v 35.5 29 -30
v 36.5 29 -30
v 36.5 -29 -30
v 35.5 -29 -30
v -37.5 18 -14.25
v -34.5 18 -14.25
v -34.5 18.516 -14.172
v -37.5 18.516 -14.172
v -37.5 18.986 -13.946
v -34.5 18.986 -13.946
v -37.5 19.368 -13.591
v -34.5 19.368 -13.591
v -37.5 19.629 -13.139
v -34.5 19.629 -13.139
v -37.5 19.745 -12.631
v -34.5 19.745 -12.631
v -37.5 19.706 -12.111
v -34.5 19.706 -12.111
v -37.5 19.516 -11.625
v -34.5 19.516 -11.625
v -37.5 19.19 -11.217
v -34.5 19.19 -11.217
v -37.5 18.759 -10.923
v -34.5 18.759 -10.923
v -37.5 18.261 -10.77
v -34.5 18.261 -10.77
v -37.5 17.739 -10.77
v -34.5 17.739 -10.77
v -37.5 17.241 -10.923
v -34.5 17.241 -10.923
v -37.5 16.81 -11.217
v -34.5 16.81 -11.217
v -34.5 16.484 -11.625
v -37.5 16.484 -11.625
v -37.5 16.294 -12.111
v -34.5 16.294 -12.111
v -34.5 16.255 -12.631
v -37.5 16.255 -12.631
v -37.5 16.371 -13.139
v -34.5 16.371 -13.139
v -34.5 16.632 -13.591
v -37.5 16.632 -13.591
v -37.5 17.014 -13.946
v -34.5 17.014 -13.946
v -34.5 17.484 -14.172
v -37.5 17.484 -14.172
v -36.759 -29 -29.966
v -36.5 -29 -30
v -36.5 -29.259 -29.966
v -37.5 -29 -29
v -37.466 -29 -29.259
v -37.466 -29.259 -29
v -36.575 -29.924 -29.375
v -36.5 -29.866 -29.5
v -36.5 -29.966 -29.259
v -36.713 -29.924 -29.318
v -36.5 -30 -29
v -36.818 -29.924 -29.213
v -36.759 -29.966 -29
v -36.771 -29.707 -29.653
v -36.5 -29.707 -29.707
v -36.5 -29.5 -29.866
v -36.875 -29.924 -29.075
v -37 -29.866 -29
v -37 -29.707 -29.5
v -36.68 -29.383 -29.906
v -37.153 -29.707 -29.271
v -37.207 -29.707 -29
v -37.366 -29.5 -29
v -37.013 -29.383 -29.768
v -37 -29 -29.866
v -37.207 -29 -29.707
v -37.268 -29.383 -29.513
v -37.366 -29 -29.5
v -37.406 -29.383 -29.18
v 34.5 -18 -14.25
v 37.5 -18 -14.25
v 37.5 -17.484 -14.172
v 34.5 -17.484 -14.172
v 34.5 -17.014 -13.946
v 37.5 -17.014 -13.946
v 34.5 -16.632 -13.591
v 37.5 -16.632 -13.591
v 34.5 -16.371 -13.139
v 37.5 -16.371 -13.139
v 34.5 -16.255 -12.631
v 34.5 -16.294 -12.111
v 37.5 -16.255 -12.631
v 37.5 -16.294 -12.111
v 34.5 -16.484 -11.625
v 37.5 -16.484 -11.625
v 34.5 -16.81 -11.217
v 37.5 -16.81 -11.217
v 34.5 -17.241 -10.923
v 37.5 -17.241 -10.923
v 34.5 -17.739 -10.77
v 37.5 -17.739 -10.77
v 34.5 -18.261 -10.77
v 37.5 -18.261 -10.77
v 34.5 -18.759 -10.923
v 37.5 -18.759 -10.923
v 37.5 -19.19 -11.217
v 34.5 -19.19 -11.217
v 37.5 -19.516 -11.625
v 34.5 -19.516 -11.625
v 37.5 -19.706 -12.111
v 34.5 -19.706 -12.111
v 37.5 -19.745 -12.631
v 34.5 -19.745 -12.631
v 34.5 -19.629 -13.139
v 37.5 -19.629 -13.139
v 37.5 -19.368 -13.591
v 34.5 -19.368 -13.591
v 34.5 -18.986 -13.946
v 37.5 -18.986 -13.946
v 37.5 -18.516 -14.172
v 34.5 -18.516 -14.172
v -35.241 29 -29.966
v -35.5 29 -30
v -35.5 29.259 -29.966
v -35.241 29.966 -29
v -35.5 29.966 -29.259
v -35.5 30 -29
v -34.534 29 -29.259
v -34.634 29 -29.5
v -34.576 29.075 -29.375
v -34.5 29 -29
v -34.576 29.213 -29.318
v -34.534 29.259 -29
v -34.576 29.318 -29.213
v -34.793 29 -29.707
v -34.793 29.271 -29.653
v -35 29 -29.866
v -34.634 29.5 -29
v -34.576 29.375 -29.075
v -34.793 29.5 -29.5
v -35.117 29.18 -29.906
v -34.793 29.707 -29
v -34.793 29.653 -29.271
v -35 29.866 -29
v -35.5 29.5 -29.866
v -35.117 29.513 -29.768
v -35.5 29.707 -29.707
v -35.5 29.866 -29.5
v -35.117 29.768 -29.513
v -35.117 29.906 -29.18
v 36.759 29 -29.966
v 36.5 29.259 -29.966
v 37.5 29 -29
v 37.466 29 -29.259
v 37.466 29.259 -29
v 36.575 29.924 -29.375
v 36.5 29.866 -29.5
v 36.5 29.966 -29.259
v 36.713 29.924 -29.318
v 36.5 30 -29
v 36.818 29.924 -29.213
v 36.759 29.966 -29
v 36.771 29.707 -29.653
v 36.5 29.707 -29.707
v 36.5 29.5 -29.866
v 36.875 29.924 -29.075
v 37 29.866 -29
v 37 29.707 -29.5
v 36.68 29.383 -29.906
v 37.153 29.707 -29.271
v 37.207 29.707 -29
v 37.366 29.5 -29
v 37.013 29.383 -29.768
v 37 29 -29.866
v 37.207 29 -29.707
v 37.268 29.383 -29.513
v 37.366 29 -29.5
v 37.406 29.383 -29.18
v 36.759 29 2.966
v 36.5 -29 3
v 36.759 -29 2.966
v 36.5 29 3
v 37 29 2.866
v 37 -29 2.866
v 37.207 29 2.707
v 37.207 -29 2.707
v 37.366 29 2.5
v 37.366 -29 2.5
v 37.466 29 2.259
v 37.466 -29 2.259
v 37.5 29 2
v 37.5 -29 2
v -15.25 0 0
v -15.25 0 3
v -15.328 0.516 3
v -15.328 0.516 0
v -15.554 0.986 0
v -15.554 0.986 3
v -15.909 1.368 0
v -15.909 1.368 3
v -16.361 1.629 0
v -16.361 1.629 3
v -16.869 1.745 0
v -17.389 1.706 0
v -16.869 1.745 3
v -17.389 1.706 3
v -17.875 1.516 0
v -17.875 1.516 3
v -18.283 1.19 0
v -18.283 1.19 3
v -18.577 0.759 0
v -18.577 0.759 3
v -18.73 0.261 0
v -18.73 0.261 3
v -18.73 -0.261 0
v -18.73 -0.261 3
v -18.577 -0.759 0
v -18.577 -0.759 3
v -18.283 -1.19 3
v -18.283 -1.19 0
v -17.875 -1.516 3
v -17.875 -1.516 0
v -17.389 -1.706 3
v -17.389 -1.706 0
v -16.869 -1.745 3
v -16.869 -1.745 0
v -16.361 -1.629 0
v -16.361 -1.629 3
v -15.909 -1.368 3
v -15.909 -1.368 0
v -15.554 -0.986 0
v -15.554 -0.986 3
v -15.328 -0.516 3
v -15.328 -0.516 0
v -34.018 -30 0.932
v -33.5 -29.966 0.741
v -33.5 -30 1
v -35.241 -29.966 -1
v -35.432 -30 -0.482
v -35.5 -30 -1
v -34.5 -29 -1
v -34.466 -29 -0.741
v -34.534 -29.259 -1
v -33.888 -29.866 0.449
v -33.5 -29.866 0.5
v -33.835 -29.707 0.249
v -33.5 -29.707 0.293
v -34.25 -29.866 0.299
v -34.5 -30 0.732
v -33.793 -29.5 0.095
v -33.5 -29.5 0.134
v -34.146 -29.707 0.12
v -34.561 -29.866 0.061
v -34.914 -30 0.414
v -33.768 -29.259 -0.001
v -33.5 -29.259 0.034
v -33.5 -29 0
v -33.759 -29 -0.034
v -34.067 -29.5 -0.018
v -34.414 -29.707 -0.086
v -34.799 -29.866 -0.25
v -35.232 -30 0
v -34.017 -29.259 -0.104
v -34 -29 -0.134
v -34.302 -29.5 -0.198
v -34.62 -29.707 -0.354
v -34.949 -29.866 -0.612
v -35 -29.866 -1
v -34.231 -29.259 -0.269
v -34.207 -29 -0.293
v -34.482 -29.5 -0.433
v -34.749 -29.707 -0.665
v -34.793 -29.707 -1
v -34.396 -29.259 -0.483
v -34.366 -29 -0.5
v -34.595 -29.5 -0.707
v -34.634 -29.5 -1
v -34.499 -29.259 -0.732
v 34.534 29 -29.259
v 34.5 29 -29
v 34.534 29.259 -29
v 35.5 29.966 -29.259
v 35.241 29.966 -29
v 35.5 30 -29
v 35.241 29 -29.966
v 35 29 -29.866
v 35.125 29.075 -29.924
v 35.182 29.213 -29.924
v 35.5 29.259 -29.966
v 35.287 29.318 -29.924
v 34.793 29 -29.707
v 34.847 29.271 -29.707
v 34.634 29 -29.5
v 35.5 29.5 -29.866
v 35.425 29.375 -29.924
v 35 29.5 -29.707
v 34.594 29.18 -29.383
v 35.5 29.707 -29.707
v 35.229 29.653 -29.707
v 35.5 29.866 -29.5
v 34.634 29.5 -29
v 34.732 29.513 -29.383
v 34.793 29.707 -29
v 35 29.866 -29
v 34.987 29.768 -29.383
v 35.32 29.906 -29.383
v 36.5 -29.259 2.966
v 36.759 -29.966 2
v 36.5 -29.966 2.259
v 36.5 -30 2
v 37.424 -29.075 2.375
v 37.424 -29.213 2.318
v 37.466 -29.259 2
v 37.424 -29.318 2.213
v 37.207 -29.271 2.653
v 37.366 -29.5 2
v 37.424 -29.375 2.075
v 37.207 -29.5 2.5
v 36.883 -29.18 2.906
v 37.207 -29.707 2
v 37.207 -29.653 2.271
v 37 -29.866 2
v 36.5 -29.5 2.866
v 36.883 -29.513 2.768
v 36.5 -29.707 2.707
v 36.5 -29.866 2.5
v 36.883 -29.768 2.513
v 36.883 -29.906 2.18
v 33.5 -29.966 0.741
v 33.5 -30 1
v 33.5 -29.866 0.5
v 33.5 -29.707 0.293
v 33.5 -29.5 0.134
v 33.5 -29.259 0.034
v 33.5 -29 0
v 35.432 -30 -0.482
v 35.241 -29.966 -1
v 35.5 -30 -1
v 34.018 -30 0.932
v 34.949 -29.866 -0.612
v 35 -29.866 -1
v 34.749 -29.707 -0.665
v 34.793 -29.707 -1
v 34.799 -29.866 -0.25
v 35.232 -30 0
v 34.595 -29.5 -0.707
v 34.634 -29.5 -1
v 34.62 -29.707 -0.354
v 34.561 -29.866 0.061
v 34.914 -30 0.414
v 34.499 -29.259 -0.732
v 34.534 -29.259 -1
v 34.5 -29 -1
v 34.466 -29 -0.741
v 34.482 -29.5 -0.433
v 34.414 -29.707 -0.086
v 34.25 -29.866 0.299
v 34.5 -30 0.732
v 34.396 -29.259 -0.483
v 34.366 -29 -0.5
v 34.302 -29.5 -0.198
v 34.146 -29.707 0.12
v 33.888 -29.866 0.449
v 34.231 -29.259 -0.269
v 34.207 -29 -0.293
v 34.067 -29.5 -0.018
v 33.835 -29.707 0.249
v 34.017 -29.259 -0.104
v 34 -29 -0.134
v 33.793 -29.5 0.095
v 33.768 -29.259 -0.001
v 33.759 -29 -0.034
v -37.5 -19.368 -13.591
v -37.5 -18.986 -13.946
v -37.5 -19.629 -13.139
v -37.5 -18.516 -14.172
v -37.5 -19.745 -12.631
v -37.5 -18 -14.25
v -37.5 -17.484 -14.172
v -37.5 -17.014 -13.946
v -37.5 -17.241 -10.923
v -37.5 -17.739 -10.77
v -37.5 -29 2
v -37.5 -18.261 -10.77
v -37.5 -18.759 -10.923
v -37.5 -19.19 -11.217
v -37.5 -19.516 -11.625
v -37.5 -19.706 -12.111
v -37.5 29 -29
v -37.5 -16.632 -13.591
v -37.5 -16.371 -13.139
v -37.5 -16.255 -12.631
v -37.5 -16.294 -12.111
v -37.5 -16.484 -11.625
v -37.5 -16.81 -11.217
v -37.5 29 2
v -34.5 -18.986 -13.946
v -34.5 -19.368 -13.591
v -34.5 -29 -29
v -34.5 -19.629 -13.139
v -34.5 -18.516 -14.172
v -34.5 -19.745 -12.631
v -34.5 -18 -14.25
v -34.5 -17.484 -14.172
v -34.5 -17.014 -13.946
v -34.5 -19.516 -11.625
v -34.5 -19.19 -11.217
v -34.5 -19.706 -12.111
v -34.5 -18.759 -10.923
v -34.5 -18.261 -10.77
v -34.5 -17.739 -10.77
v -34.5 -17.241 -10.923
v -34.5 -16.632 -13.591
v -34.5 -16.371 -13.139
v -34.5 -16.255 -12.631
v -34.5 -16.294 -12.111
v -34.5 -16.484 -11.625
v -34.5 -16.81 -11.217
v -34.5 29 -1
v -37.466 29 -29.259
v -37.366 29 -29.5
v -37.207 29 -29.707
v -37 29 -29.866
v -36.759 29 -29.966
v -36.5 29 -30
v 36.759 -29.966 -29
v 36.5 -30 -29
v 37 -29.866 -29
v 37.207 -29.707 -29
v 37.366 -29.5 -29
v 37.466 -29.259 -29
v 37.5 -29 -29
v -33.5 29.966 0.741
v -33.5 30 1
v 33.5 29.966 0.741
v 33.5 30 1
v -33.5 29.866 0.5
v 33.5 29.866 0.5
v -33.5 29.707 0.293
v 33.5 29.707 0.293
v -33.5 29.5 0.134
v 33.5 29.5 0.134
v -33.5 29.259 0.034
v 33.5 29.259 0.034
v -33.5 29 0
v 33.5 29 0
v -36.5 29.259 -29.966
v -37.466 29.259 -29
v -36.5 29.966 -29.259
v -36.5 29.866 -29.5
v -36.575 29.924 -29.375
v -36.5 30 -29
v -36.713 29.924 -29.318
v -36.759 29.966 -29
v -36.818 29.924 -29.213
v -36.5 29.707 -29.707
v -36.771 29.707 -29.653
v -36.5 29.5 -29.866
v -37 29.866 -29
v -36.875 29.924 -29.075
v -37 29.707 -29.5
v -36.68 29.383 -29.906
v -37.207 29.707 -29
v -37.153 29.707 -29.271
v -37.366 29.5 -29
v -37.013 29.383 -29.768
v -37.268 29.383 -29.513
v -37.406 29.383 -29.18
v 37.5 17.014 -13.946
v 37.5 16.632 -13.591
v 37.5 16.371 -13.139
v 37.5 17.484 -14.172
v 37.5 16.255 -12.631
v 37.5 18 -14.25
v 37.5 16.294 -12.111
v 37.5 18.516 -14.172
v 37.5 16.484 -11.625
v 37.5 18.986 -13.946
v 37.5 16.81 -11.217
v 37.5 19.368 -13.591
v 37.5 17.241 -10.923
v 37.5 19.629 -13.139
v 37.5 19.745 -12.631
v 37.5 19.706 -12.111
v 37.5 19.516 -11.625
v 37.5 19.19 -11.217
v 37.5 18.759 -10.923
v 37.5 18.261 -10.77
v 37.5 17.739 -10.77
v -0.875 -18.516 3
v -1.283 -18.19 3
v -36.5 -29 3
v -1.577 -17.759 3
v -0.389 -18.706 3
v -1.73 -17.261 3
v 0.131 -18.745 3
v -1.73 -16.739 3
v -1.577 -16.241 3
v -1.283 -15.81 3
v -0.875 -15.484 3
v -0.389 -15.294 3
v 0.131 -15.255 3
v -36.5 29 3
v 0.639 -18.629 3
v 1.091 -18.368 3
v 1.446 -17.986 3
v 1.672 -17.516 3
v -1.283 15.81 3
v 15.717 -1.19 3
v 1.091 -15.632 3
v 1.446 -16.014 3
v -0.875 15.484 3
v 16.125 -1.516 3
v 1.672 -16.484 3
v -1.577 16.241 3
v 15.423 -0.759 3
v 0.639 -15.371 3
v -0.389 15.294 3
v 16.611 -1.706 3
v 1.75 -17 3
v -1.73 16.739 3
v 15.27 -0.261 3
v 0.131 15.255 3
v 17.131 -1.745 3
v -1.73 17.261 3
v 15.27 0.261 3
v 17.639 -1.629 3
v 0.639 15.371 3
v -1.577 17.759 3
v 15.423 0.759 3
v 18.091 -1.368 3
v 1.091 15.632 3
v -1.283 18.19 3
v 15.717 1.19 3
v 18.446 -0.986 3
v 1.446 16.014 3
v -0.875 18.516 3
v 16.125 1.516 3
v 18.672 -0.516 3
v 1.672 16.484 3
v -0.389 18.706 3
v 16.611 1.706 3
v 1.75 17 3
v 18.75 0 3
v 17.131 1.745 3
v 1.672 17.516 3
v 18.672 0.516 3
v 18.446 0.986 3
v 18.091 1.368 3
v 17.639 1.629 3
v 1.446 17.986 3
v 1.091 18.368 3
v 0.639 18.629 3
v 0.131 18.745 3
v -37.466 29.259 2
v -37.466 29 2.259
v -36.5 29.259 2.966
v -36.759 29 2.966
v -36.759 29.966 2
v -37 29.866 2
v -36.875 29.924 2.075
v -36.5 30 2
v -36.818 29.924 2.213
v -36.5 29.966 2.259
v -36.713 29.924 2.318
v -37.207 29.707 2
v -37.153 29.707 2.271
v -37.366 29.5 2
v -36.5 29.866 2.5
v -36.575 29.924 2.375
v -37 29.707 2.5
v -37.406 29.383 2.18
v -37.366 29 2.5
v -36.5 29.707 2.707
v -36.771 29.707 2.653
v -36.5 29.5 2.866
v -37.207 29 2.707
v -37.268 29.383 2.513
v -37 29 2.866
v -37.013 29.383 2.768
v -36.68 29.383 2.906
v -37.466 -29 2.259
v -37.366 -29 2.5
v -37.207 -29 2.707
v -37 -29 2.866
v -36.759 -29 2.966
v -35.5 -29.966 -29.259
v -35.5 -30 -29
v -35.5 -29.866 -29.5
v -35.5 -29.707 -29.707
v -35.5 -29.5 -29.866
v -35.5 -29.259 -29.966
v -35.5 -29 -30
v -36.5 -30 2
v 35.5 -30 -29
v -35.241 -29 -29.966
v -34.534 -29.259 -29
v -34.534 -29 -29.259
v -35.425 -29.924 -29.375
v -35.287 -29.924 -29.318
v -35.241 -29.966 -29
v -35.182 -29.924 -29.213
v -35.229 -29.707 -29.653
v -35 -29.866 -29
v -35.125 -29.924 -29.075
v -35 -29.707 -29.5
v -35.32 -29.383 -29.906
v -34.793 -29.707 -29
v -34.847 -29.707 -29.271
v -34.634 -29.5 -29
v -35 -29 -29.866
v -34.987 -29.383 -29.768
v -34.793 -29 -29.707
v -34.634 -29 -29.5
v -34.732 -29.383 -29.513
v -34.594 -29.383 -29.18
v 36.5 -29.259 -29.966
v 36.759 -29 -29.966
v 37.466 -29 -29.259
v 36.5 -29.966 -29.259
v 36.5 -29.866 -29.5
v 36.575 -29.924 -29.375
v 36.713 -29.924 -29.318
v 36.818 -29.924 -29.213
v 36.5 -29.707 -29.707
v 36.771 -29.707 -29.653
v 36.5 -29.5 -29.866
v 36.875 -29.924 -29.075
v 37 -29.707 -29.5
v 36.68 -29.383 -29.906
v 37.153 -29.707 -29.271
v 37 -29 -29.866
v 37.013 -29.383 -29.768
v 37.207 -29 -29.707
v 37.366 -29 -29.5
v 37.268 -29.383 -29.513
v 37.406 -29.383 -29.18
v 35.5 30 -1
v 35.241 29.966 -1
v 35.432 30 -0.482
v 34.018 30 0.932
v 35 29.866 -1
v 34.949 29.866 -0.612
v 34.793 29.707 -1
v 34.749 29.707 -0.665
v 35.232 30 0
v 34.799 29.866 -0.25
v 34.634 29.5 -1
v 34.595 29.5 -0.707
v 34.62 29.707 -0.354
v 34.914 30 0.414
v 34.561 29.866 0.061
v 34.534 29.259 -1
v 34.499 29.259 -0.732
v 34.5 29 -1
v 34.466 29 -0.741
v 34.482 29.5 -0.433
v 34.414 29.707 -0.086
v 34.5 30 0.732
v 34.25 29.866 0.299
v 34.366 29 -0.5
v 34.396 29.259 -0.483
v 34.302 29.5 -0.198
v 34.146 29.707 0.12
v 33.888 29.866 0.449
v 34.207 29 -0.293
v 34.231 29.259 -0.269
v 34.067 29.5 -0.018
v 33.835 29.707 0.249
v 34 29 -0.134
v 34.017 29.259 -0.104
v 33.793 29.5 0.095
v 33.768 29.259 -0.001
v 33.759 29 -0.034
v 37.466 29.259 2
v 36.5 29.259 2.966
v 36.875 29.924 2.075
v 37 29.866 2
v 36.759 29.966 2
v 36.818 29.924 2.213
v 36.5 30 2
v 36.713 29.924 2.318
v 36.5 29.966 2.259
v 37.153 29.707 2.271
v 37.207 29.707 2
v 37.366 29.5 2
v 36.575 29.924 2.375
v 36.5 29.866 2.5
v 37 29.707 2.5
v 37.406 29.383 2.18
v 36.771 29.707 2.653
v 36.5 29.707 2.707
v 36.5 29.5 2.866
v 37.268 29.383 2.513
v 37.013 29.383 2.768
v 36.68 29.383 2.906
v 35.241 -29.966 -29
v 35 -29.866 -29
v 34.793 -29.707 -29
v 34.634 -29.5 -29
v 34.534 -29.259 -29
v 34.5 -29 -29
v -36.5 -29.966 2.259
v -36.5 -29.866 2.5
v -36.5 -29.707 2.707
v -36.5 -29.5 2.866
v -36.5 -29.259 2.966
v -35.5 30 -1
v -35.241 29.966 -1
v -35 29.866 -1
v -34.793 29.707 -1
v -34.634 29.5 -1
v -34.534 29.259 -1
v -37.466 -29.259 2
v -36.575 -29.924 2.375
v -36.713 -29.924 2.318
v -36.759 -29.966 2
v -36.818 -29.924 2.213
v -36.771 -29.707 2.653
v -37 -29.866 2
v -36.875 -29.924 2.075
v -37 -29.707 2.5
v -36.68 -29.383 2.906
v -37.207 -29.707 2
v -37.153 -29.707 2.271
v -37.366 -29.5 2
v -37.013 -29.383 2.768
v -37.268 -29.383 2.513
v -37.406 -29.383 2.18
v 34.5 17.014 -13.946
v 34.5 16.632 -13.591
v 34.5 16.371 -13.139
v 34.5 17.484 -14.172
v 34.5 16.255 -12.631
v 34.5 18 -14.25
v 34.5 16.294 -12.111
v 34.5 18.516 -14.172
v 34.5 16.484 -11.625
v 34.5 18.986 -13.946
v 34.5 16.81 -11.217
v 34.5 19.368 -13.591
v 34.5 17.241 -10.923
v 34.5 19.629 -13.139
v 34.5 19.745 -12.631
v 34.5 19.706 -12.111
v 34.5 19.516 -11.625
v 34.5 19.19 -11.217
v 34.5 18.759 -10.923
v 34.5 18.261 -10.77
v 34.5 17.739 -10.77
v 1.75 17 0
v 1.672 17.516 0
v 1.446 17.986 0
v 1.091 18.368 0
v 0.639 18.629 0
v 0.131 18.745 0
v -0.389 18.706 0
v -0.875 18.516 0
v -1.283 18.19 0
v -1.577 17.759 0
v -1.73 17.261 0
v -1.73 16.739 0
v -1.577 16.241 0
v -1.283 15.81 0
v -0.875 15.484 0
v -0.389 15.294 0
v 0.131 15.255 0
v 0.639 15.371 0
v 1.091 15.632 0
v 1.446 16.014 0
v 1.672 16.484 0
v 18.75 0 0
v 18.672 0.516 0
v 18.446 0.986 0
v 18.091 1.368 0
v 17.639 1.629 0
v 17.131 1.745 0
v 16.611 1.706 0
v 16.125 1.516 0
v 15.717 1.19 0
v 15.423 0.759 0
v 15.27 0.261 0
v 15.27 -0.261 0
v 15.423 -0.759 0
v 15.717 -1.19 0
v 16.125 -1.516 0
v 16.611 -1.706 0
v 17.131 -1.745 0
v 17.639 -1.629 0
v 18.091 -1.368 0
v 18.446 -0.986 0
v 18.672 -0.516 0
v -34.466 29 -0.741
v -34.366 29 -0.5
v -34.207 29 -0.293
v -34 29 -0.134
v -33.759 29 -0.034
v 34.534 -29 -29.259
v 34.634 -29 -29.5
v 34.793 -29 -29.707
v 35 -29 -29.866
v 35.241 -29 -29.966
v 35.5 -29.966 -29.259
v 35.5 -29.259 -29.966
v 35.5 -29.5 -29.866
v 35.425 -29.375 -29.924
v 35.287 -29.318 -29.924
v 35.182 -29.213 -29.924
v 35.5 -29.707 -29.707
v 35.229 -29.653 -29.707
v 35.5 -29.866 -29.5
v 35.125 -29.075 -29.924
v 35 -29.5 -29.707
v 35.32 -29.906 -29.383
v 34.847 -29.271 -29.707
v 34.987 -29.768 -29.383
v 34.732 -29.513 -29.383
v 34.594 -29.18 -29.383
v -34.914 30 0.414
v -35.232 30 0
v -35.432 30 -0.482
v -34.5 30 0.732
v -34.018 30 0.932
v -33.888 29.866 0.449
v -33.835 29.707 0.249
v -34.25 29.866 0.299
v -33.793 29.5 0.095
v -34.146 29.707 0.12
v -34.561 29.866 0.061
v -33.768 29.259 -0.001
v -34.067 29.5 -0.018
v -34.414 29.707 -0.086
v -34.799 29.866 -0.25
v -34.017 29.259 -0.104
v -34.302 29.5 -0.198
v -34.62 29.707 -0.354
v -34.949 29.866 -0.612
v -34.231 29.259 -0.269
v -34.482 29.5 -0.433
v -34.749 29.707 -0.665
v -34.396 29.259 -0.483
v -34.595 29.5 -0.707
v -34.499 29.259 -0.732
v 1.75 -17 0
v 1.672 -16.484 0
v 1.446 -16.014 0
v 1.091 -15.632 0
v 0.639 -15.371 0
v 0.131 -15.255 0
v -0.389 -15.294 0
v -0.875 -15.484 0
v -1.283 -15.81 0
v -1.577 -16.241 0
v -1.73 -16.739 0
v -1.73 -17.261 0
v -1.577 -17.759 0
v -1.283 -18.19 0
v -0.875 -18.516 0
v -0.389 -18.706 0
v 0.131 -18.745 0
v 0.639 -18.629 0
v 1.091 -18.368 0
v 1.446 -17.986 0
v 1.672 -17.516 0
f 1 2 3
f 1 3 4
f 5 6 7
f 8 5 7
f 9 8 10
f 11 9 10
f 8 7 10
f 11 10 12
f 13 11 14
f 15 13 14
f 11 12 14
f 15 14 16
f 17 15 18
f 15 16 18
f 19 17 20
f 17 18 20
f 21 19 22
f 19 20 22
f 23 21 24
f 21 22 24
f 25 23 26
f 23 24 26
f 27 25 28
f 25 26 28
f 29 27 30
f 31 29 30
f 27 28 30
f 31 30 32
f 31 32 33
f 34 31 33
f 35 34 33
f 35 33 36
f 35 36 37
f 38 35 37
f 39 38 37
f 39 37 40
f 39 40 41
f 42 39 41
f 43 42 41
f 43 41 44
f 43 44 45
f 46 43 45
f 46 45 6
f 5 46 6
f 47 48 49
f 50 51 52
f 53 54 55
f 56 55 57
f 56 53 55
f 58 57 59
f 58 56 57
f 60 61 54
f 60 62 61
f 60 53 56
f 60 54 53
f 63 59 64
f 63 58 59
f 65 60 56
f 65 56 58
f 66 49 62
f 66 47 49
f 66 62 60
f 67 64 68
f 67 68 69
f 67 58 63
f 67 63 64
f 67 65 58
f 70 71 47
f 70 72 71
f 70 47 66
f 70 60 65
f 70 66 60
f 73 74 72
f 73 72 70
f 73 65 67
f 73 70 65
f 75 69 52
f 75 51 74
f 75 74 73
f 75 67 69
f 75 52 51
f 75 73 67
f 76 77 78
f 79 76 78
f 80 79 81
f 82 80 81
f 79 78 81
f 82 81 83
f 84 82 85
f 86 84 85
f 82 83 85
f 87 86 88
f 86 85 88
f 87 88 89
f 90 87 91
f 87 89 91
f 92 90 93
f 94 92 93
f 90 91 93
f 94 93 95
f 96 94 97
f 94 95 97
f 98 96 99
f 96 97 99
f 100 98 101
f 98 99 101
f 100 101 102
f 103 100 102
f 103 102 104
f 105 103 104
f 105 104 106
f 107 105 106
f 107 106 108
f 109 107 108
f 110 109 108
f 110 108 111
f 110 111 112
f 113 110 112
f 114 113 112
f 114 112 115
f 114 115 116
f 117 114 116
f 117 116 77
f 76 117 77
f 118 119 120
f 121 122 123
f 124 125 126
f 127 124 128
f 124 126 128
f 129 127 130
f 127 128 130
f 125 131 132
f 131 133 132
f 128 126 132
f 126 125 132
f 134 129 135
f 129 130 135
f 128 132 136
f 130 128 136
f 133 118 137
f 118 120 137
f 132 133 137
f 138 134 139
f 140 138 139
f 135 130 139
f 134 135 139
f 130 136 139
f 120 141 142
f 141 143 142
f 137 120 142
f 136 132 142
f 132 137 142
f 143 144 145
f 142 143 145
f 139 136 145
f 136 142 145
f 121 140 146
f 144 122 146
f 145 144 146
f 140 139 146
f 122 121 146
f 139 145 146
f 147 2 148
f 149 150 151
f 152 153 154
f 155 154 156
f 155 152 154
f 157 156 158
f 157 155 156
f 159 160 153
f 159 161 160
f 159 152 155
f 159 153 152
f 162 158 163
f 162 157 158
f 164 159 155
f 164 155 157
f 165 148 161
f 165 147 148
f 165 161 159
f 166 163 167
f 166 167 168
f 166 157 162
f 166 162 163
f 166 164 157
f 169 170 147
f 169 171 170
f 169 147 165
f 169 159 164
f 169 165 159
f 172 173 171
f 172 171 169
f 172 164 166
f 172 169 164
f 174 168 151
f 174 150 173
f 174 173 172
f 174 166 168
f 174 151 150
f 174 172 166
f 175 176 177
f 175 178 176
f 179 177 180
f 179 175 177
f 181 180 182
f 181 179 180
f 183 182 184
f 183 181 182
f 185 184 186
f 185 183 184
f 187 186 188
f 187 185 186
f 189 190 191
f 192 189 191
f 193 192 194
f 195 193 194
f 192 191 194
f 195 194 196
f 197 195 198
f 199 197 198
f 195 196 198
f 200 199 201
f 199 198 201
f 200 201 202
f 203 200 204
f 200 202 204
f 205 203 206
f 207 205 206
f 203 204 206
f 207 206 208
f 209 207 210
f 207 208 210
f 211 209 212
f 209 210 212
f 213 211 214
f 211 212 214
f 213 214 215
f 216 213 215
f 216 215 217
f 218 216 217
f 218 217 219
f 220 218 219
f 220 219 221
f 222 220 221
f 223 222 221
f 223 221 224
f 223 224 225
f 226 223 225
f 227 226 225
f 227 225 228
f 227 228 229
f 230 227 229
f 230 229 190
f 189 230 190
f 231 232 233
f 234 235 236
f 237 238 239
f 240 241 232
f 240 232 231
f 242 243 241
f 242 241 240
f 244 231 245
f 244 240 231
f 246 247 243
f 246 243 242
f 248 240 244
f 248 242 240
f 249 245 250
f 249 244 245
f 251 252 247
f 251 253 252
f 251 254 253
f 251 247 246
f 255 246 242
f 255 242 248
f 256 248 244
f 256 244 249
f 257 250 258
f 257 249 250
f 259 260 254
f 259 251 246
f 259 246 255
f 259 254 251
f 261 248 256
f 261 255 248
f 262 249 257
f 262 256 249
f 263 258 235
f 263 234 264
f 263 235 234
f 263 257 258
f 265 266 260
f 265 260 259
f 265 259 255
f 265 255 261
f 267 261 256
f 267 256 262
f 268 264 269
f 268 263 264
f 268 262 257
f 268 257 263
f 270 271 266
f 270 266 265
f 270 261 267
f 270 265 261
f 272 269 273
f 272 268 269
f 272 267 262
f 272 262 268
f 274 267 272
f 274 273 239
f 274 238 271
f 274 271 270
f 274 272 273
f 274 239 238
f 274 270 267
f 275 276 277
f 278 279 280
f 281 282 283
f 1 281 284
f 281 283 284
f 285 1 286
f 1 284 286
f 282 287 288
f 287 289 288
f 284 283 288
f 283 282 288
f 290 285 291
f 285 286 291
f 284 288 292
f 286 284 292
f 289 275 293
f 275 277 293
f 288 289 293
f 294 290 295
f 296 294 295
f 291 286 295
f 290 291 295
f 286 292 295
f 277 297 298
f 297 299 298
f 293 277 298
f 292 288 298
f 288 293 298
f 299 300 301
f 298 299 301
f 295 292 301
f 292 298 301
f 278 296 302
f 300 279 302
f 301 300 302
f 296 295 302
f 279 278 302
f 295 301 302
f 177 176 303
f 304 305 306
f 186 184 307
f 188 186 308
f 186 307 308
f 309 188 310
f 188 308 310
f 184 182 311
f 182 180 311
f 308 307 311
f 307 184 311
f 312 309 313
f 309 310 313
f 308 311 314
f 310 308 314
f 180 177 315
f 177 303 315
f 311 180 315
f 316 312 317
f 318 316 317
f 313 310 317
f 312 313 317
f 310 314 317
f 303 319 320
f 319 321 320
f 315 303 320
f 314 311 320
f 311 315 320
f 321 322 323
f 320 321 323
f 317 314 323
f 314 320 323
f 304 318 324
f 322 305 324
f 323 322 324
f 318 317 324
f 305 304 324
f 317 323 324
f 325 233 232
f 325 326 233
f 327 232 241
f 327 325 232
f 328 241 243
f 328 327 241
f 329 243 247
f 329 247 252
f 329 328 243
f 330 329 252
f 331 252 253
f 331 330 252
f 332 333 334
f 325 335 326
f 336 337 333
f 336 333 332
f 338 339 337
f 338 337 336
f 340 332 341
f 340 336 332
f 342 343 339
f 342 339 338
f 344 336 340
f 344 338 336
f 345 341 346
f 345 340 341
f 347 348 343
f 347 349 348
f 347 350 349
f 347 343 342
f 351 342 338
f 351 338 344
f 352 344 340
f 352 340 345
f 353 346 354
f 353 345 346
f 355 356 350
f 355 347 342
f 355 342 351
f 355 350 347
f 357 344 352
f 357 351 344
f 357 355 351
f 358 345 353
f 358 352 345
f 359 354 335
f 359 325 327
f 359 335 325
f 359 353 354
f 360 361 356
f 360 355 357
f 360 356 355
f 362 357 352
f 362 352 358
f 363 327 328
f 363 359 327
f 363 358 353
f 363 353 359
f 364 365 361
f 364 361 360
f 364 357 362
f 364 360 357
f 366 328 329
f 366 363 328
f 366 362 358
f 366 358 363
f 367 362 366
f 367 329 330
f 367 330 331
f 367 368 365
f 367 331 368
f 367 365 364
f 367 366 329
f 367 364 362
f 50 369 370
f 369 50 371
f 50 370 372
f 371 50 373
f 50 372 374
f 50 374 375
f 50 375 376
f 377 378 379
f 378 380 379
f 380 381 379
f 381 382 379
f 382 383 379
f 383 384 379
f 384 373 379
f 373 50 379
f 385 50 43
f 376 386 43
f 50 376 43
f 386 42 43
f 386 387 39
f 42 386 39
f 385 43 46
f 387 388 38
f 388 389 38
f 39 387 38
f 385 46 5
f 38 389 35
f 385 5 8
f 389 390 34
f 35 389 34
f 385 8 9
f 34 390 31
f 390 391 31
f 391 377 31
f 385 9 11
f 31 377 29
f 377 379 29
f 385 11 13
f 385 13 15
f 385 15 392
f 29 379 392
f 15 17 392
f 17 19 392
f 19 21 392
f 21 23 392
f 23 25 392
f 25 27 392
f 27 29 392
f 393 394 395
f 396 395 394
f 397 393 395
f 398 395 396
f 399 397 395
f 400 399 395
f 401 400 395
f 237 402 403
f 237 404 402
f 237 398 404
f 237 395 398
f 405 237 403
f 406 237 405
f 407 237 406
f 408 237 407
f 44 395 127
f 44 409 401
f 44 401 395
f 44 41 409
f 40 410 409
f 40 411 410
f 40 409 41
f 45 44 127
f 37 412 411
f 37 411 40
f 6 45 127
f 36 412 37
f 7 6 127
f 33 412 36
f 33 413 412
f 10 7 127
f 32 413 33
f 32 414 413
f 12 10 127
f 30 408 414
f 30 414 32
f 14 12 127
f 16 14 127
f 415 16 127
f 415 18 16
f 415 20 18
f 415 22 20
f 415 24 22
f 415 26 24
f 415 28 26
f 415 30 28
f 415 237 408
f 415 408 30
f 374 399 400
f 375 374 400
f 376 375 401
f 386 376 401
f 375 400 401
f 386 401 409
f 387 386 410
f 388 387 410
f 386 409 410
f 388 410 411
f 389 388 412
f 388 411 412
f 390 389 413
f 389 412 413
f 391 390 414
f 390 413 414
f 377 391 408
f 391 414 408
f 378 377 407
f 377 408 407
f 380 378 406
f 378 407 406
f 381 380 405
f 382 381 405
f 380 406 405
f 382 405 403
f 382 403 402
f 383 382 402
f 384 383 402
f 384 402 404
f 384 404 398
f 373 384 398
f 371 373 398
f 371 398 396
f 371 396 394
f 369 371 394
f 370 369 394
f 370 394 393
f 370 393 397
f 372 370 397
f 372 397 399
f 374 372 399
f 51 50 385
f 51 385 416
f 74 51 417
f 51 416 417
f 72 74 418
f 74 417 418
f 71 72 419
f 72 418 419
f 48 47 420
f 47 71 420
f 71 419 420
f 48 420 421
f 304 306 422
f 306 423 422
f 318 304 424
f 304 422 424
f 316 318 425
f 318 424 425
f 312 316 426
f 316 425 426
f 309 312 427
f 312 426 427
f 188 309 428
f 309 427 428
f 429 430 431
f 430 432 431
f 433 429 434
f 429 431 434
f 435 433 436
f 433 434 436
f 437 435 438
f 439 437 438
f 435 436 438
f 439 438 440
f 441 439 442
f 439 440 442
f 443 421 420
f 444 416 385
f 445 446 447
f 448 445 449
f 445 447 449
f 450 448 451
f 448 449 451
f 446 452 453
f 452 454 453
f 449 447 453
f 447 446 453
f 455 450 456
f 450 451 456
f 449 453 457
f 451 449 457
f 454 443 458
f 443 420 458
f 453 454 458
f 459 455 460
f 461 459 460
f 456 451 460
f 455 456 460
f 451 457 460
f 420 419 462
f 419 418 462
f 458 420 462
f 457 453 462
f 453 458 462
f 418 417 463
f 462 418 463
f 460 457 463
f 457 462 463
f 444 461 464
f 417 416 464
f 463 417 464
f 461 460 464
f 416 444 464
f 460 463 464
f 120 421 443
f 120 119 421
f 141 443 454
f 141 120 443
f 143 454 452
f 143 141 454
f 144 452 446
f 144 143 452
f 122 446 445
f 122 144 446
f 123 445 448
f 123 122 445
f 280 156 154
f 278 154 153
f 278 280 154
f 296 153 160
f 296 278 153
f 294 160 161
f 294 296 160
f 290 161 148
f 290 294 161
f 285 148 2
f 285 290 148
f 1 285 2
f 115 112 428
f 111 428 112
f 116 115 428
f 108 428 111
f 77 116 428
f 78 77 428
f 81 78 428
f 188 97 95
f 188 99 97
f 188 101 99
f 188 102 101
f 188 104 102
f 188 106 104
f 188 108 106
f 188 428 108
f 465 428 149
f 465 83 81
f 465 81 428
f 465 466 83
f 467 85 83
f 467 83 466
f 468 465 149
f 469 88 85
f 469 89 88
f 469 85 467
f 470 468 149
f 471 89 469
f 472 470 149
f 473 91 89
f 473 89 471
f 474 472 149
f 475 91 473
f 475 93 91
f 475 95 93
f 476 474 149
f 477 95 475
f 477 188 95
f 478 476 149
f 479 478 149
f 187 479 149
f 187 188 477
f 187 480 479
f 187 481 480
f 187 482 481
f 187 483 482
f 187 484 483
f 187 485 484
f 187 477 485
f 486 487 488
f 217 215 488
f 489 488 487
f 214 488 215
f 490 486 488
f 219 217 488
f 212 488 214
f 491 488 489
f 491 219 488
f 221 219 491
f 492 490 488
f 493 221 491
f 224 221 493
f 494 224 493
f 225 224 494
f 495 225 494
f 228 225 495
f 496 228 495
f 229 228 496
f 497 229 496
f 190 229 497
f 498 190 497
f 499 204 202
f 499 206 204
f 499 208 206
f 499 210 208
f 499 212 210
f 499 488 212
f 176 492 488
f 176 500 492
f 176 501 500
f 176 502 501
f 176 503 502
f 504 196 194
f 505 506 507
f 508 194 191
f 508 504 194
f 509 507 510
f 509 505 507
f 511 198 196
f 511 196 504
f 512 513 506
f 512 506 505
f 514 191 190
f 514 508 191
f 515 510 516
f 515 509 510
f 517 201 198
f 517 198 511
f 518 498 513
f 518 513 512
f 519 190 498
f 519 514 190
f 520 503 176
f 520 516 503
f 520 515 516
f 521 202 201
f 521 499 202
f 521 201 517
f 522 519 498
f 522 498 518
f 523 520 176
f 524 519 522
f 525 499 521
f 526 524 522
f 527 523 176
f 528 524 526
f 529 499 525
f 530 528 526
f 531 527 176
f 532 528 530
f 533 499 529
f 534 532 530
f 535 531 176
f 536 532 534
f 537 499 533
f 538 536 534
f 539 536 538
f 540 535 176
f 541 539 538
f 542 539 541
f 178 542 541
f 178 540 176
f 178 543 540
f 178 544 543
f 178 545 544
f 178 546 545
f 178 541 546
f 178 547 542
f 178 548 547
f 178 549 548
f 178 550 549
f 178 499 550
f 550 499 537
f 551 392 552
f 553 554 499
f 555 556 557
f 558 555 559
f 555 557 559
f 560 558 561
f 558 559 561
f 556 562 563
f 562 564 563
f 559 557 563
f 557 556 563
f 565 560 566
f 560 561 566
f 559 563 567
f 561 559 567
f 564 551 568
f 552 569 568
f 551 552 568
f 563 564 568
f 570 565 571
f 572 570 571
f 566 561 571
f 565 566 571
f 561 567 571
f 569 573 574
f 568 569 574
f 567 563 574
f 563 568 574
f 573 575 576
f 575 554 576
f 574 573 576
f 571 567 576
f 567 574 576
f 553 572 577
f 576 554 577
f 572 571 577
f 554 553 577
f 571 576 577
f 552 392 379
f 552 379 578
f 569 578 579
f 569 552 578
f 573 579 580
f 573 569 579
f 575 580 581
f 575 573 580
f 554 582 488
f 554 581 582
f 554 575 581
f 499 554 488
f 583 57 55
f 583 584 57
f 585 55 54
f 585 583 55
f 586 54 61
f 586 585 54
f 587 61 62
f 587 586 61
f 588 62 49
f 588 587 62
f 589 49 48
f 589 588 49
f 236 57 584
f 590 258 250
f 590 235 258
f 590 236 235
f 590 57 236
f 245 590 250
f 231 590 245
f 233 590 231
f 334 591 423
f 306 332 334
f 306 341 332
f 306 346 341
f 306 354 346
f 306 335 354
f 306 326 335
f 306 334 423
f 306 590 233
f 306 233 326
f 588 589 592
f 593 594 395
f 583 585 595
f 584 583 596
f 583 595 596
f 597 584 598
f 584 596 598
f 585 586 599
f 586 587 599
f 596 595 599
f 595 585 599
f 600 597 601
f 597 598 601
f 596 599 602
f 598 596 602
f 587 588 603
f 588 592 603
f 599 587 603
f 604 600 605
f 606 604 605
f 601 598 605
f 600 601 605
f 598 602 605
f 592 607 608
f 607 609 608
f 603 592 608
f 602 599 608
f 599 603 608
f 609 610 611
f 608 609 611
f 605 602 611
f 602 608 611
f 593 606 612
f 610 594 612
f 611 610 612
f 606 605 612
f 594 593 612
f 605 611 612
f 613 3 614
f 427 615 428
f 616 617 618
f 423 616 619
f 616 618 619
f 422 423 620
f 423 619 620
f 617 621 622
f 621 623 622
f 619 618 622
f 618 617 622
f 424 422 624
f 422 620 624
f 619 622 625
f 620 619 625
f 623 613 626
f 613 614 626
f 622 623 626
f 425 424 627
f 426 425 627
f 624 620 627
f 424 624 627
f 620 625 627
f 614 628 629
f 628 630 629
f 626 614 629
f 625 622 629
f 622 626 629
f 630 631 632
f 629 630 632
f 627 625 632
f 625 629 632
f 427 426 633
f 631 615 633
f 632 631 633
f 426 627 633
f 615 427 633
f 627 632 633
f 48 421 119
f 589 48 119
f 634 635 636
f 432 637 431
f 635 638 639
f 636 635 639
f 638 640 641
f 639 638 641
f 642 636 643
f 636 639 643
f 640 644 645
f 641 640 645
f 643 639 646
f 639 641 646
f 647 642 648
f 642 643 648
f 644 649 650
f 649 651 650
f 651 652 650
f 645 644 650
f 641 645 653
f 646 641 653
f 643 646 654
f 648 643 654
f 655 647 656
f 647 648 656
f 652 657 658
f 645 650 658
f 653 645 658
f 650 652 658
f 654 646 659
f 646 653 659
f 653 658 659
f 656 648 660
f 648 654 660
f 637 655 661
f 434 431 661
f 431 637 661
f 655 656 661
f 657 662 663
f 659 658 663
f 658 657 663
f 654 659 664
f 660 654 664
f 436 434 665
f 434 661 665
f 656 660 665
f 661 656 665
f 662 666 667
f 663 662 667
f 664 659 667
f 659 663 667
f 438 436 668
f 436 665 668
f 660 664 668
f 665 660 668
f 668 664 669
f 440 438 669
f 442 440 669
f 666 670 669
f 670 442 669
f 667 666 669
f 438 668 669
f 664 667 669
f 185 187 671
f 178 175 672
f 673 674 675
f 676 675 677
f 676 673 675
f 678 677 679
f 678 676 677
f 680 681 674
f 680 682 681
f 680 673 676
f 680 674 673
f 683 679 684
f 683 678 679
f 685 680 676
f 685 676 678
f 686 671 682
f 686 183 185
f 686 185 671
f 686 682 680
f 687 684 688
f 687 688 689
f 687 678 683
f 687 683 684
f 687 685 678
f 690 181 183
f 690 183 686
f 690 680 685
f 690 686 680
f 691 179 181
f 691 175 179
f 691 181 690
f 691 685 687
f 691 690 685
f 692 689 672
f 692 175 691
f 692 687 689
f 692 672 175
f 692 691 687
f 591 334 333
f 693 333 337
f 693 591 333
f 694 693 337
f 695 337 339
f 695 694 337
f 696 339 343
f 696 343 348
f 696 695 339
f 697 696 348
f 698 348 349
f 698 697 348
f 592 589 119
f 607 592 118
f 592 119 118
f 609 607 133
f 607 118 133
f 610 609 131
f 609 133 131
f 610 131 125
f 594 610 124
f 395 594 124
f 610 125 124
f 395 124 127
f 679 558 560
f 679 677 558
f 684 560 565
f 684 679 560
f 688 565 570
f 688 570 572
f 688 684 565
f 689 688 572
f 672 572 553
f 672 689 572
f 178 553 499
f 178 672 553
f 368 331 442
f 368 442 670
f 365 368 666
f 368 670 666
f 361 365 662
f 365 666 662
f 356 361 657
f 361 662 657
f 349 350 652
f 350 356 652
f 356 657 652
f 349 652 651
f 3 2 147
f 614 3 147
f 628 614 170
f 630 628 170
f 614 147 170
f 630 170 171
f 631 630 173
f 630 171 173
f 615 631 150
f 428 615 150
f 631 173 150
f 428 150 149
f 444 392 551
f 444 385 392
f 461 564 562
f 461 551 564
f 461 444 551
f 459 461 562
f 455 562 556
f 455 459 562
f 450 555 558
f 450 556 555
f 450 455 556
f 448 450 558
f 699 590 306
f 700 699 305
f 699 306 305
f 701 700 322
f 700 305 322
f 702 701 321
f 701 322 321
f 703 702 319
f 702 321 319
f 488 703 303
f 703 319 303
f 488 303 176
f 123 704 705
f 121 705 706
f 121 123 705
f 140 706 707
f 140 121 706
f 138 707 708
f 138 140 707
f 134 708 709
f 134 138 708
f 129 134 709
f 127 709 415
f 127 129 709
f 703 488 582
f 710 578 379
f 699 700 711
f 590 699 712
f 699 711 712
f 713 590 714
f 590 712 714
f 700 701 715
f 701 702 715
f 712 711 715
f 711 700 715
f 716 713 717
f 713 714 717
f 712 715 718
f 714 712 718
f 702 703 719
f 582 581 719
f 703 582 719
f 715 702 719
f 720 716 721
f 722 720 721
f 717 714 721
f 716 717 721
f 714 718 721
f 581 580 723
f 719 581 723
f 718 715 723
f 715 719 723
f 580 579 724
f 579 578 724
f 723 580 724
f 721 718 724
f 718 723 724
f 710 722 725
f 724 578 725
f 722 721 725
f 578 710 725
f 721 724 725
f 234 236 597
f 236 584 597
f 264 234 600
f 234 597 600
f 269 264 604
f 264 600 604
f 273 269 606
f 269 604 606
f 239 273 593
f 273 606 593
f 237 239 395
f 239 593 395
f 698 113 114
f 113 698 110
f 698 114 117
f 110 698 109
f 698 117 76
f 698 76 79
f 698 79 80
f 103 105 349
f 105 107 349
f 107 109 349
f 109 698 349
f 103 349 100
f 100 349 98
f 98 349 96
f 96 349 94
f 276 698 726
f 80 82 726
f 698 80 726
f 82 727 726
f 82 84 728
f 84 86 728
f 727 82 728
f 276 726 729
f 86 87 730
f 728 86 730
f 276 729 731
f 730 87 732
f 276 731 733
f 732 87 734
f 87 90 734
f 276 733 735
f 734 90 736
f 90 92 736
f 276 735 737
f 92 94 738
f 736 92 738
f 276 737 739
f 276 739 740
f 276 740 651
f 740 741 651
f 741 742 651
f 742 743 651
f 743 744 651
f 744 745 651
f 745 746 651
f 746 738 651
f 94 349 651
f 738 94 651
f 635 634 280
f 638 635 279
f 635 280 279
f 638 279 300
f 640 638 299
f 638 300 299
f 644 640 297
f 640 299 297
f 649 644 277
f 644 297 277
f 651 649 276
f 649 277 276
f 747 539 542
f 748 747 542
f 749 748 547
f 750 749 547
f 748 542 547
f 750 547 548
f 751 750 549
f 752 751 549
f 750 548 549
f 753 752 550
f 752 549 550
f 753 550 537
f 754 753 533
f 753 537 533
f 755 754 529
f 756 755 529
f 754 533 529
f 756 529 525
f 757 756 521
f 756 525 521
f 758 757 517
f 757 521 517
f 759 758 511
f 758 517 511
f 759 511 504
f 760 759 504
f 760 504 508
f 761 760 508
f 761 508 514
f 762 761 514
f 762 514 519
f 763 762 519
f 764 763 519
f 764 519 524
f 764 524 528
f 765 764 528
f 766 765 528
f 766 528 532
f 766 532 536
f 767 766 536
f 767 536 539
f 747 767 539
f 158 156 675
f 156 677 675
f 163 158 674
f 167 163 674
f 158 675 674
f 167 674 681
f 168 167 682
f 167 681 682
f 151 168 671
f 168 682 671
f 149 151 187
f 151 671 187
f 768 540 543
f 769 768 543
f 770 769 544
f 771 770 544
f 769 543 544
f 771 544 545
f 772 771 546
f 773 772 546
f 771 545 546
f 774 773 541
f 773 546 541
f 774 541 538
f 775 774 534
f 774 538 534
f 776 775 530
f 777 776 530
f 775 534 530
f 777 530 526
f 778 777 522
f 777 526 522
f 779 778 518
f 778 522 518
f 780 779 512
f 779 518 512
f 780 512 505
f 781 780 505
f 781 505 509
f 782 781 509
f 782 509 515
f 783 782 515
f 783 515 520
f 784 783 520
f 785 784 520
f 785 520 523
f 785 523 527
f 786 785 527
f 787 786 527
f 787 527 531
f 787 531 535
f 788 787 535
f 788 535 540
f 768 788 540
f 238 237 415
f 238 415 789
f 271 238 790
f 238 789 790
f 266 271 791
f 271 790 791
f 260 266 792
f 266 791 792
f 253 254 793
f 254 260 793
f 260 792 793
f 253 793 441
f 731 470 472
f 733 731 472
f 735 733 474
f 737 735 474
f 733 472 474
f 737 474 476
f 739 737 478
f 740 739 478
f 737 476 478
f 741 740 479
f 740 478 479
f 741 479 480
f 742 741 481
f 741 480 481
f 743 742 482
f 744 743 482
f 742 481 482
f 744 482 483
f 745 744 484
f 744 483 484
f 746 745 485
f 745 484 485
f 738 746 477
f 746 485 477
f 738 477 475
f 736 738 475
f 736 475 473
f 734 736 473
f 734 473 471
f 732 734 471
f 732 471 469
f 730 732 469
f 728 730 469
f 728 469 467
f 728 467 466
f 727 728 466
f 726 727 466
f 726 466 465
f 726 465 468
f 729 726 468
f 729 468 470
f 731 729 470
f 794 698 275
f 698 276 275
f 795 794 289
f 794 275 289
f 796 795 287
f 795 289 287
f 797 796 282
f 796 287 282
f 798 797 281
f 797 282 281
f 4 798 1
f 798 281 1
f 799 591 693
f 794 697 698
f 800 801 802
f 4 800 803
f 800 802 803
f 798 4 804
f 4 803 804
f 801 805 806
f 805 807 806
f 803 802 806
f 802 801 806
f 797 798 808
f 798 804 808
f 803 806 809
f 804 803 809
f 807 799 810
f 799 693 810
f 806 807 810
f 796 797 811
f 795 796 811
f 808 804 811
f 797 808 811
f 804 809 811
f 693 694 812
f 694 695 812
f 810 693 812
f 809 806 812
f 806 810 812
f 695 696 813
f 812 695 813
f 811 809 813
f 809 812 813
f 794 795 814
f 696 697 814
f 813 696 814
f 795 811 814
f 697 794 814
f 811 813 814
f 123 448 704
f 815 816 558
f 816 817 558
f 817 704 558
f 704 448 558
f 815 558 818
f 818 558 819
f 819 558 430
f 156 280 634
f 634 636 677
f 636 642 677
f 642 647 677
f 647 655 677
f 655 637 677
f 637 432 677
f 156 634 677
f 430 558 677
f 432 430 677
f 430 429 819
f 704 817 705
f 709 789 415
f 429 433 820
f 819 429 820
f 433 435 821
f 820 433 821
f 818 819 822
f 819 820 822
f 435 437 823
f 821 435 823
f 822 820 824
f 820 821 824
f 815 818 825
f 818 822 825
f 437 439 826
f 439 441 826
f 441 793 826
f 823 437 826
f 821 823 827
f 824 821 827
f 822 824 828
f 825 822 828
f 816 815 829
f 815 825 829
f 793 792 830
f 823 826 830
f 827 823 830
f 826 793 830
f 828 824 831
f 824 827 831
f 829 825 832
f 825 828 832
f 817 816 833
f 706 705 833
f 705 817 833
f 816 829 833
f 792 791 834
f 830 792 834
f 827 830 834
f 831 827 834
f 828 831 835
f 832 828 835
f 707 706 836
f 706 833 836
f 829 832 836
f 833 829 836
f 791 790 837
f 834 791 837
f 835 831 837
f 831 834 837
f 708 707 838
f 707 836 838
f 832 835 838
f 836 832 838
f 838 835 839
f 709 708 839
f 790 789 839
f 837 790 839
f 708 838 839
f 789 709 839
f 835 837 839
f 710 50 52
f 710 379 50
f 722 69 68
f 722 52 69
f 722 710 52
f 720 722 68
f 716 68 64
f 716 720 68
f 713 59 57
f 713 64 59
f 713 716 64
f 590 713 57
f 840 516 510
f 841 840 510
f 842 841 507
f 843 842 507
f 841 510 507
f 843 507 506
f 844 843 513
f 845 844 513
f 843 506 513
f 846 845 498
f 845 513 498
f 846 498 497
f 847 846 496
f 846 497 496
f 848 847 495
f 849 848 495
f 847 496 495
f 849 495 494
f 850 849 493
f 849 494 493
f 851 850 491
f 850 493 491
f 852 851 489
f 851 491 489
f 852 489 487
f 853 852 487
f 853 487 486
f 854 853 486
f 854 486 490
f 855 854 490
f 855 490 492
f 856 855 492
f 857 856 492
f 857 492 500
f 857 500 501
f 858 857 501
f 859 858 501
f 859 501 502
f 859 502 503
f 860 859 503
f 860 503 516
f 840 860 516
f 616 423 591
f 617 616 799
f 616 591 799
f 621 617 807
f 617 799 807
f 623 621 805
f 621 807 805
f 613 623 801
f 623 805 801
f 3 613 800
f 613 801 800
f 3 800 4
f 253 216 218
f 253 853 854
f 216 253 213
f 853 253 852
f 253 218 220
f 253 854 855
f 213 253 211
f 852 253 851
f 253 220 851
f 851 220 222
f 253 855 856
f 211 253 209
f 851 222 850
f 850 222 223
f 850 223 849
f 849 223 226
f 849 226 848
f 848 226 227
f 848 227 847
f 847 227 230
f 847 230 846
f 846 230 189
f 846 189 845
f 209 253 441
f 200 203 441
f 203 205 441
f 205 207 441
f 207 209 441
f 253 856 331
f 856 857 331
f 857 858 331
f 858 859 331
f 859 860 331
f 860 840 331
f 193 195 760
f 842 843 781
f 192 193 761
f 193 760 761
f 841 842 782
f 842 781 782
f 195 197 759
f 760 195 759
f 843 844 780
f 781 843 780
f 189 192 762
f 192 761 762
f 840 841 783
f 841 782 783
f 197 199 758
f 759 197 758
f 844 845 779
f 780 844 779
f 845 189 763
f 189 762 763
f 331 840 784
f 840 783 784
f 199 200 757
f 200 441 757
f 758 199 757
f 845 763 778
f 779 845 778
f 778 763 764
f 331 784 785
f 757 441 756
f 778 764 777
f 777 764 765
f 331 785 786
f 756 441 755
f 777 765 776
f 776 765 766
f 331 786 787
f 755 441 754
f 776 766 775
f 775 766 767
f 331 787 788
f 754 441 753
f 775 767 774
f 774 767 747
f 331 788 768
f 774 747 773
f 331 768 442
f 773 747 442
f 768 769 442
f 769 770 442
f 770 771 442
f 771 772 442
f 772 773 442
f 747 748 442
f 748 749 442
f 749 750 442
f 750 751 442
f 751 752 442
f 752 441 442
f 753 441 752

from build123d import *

# Parameters (mm, degrees)
SKETCH1_W           = 75
SKETCH1_H           = 60
BOSS_EXTRUDE1_DEPTH = 3
SKETCH2_W           = 3
SKETCH2_H           = 60
BOSS_EXTRUDE2_DEPTH = 30
SKETCH3_R           = 1.75
CUT_EXTRUDE1_DEPTH  = 30
FILLET1_R           = 1
SKETCH4_R           = 1.75
CUT_EXTRUDE2_DEPTH  = 87.168439698


with BuildPart() as part:
    # Sketch1 → Boss-Extrude1 (new body)
    with BuildSketch(Plane.XY):
        Rectangle(SKETCH1_W, SKETCH1_H)
    extrude(amount=BOSS_EXTRUDE1_DEPTH)

    # Sketch2 → Boss-Extrude2 (add)
    with BuildSketch(Plane(origin=(0, 0, 0), x_dir=(-1, 0, 0), z_dir=(0, 0, -1))):
        with Locations((-36, 0)):
            Rectangle(SKETCH2_W, SKETCH2_H)
    boss_extrude2 = extrude(amount=BOSS_EXTRUDE2_DEPTH)

    # Mirror1: Boss-Extrude2 across plane
    add(boss_extrude2.mirror(Plane(origin=(0, 0, 0), x_dir=(0, 0, 1), z_dir=(1, 0, 0))))

    # Sketch3 → Cut-Extrude1 (cut)
    with BuildSketch(Plane.XY.offset(3)):
        with Locations((0, 17)):
            Circle(SKETCH3_R)
        with Locations((17, 0)):
            Circle(SKETCH3_R)
        with Locations((0, -17)):
            Circle(SKETCH3_R)
        with Locations((-17, 0)):
            Circle(SKETCH3_R)
    extrude(amount=-CUT_EXTRUDE1_DEPTH, mode=Mode.SUBTRACT)

    # Fillet1
    fillet1_edges = [part.edges().sort_by_distance(p)[0] for p in [
        (-37.5, 0, 3),
        (0, 30, 0),
        (34.5, 0, 0),
        (34.5, -30, -15),
        (34.5, 30, -15),
        (37.5, 0, -30),
        (0, -30, 3),
        (36, -30, -30),
        (34.5, 0, -30),
        (36, 30, -30),
        (0, -30, 0),
        (-37.5, 0, -30),
        (-36, 30, -30),
        (-34.5, 0, -30),
        (-34.5, 30, -15),
        (-36, -30, -30),
        (-34.5, -30, -15),
        (-34.5, 0, 0),
        (37.5, 0, 3),
        (37.5, -30, -13.5),
        (-37.5, -30, -13.5),
        (-37.5, 30, -13.5),
        (37.5, 30, -13.5),
        (0, 30, 3),
    ]]
    fillet(fillet1_edges, radius=FILLET1_R)

    # Sketch4 → Cut-Extrude2 (cut, through all)
    with BuildSketch(Plane(origin=(37.5, 0, 0), x_dir=(0, 0, -1), z_dir=(1, 0, 0))):
        with Locations((12.5, 18)):
            Circle(SKETCH4_R)
        with Locations((12.5, -18)):
            Circle(SKETCH4_R)
    extrude(amount=-CUT_EXTRUDE2_DEPTH, mode=Mode.SUBTRACT)


solid = part.part
